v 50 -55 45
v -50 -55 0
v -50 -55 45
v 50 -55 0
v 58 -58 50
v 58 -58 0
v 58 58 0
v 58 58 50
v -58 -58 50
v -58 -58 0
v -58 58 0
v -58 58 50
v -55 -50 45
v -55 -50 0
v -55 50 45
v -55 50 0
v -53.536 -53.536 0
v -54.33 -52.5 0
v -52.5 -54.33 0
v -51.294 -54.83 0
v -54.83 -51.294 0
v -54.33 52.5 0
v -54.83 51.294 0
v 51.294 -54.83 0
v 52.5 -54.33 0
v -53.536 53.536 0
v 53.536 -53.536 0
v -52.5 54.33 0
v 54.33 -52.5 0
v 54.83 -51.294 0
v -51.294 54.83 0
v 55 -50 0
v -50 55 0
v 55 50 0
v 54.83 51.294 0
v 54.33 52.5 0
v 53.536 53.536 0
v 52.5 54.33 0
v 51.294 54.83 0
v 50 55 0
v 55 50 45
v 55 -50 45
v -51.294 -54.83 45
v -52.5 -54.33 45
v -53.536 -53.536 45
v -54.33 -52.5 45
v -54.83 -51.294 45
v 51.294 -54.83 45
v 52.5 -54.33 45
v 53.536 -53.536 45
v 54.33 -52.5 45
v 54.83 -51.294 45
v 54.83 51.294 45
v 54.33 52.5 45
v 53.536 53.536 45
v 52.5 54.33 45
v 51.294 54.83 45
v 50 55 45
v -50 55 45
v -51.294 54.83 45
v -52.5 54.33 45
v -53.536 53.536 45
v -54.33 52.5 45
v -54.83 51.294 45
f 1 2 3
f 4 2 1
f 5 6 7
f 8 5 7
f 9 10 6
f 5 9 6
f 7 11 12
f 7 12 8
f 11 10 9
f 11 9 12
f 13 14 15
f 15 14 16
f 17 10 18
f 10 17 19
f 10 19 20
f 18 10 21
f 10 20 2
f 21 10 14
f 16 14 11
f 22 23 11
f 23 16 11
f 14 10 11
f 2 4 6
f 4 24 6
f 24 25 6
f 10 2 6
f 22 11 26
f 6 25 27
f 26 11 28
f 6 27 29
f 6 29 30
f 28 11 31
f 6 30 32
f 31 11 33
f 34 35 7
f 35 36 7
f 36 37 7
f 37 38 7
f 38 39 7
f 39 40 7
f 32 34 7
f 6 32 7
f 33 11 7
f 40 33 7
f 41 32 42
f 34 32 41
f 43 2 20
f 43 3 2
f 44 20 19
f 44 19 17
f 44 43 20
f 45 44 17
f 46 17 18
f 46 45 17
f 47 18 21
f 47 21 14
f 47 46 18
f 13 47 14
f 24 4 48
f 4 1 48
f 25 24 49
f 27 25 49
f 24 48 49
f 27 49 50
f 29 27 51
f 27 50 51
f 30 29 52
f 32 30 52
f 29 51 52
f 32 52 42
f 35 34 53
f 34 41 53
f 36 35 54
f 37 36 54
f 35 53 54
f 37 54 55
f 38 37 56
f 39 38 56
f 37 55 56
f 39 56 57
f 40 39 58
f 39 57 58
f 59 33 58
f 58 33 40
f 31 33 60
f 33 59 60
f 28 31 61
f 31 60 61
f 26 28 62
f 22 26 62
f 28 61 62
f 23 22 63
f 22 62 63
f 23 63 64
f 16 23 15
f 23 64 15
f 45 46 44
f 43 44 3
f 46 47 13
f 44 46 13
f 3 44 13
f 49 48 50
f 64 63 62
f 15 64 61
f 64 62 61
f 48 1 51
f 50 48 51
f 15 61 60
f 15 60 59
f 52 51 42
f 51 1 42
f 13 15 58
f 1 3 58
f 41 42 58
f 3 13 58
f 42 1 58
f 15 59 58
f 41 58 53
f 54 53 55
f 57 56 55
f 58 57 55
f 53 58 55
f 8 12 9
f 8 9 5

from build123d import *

# Parameters (mm, degrees)
F0_W     = 116
F0_H     = 116
F1_DEPTH = 50
F2_W     = 110
F2_H     = 110
F3_DEPTH = 45
F4_R     = 5


with BuildPart() as f1:
    # F0 (on Top) → F1 (new body)
    with BuildSketch(Plane.XY):
        Rectangle(F0_W, F0_H)
    extrude(amount=F1_DEPTH)

    # F2 (on Top) → F3 (cut)
    with BuildSketch(Plane.XY):
        Rectangle(F2_W, F2_H)
    extrude(amount=F3_DEPTH, mode=Mode.SUBTRACT)

    # F4
    f4_edges = [f1.edges().sort_by_distance(p)[0] for p in [
        (55, 55, 22.5),
        (-55, -55, 22.5),
        (55, -55, 22.5),
        (-55, 55, 22.5),
    ]]
    fillet(f4_edges, radius=F4_R)


solid = f1.part
